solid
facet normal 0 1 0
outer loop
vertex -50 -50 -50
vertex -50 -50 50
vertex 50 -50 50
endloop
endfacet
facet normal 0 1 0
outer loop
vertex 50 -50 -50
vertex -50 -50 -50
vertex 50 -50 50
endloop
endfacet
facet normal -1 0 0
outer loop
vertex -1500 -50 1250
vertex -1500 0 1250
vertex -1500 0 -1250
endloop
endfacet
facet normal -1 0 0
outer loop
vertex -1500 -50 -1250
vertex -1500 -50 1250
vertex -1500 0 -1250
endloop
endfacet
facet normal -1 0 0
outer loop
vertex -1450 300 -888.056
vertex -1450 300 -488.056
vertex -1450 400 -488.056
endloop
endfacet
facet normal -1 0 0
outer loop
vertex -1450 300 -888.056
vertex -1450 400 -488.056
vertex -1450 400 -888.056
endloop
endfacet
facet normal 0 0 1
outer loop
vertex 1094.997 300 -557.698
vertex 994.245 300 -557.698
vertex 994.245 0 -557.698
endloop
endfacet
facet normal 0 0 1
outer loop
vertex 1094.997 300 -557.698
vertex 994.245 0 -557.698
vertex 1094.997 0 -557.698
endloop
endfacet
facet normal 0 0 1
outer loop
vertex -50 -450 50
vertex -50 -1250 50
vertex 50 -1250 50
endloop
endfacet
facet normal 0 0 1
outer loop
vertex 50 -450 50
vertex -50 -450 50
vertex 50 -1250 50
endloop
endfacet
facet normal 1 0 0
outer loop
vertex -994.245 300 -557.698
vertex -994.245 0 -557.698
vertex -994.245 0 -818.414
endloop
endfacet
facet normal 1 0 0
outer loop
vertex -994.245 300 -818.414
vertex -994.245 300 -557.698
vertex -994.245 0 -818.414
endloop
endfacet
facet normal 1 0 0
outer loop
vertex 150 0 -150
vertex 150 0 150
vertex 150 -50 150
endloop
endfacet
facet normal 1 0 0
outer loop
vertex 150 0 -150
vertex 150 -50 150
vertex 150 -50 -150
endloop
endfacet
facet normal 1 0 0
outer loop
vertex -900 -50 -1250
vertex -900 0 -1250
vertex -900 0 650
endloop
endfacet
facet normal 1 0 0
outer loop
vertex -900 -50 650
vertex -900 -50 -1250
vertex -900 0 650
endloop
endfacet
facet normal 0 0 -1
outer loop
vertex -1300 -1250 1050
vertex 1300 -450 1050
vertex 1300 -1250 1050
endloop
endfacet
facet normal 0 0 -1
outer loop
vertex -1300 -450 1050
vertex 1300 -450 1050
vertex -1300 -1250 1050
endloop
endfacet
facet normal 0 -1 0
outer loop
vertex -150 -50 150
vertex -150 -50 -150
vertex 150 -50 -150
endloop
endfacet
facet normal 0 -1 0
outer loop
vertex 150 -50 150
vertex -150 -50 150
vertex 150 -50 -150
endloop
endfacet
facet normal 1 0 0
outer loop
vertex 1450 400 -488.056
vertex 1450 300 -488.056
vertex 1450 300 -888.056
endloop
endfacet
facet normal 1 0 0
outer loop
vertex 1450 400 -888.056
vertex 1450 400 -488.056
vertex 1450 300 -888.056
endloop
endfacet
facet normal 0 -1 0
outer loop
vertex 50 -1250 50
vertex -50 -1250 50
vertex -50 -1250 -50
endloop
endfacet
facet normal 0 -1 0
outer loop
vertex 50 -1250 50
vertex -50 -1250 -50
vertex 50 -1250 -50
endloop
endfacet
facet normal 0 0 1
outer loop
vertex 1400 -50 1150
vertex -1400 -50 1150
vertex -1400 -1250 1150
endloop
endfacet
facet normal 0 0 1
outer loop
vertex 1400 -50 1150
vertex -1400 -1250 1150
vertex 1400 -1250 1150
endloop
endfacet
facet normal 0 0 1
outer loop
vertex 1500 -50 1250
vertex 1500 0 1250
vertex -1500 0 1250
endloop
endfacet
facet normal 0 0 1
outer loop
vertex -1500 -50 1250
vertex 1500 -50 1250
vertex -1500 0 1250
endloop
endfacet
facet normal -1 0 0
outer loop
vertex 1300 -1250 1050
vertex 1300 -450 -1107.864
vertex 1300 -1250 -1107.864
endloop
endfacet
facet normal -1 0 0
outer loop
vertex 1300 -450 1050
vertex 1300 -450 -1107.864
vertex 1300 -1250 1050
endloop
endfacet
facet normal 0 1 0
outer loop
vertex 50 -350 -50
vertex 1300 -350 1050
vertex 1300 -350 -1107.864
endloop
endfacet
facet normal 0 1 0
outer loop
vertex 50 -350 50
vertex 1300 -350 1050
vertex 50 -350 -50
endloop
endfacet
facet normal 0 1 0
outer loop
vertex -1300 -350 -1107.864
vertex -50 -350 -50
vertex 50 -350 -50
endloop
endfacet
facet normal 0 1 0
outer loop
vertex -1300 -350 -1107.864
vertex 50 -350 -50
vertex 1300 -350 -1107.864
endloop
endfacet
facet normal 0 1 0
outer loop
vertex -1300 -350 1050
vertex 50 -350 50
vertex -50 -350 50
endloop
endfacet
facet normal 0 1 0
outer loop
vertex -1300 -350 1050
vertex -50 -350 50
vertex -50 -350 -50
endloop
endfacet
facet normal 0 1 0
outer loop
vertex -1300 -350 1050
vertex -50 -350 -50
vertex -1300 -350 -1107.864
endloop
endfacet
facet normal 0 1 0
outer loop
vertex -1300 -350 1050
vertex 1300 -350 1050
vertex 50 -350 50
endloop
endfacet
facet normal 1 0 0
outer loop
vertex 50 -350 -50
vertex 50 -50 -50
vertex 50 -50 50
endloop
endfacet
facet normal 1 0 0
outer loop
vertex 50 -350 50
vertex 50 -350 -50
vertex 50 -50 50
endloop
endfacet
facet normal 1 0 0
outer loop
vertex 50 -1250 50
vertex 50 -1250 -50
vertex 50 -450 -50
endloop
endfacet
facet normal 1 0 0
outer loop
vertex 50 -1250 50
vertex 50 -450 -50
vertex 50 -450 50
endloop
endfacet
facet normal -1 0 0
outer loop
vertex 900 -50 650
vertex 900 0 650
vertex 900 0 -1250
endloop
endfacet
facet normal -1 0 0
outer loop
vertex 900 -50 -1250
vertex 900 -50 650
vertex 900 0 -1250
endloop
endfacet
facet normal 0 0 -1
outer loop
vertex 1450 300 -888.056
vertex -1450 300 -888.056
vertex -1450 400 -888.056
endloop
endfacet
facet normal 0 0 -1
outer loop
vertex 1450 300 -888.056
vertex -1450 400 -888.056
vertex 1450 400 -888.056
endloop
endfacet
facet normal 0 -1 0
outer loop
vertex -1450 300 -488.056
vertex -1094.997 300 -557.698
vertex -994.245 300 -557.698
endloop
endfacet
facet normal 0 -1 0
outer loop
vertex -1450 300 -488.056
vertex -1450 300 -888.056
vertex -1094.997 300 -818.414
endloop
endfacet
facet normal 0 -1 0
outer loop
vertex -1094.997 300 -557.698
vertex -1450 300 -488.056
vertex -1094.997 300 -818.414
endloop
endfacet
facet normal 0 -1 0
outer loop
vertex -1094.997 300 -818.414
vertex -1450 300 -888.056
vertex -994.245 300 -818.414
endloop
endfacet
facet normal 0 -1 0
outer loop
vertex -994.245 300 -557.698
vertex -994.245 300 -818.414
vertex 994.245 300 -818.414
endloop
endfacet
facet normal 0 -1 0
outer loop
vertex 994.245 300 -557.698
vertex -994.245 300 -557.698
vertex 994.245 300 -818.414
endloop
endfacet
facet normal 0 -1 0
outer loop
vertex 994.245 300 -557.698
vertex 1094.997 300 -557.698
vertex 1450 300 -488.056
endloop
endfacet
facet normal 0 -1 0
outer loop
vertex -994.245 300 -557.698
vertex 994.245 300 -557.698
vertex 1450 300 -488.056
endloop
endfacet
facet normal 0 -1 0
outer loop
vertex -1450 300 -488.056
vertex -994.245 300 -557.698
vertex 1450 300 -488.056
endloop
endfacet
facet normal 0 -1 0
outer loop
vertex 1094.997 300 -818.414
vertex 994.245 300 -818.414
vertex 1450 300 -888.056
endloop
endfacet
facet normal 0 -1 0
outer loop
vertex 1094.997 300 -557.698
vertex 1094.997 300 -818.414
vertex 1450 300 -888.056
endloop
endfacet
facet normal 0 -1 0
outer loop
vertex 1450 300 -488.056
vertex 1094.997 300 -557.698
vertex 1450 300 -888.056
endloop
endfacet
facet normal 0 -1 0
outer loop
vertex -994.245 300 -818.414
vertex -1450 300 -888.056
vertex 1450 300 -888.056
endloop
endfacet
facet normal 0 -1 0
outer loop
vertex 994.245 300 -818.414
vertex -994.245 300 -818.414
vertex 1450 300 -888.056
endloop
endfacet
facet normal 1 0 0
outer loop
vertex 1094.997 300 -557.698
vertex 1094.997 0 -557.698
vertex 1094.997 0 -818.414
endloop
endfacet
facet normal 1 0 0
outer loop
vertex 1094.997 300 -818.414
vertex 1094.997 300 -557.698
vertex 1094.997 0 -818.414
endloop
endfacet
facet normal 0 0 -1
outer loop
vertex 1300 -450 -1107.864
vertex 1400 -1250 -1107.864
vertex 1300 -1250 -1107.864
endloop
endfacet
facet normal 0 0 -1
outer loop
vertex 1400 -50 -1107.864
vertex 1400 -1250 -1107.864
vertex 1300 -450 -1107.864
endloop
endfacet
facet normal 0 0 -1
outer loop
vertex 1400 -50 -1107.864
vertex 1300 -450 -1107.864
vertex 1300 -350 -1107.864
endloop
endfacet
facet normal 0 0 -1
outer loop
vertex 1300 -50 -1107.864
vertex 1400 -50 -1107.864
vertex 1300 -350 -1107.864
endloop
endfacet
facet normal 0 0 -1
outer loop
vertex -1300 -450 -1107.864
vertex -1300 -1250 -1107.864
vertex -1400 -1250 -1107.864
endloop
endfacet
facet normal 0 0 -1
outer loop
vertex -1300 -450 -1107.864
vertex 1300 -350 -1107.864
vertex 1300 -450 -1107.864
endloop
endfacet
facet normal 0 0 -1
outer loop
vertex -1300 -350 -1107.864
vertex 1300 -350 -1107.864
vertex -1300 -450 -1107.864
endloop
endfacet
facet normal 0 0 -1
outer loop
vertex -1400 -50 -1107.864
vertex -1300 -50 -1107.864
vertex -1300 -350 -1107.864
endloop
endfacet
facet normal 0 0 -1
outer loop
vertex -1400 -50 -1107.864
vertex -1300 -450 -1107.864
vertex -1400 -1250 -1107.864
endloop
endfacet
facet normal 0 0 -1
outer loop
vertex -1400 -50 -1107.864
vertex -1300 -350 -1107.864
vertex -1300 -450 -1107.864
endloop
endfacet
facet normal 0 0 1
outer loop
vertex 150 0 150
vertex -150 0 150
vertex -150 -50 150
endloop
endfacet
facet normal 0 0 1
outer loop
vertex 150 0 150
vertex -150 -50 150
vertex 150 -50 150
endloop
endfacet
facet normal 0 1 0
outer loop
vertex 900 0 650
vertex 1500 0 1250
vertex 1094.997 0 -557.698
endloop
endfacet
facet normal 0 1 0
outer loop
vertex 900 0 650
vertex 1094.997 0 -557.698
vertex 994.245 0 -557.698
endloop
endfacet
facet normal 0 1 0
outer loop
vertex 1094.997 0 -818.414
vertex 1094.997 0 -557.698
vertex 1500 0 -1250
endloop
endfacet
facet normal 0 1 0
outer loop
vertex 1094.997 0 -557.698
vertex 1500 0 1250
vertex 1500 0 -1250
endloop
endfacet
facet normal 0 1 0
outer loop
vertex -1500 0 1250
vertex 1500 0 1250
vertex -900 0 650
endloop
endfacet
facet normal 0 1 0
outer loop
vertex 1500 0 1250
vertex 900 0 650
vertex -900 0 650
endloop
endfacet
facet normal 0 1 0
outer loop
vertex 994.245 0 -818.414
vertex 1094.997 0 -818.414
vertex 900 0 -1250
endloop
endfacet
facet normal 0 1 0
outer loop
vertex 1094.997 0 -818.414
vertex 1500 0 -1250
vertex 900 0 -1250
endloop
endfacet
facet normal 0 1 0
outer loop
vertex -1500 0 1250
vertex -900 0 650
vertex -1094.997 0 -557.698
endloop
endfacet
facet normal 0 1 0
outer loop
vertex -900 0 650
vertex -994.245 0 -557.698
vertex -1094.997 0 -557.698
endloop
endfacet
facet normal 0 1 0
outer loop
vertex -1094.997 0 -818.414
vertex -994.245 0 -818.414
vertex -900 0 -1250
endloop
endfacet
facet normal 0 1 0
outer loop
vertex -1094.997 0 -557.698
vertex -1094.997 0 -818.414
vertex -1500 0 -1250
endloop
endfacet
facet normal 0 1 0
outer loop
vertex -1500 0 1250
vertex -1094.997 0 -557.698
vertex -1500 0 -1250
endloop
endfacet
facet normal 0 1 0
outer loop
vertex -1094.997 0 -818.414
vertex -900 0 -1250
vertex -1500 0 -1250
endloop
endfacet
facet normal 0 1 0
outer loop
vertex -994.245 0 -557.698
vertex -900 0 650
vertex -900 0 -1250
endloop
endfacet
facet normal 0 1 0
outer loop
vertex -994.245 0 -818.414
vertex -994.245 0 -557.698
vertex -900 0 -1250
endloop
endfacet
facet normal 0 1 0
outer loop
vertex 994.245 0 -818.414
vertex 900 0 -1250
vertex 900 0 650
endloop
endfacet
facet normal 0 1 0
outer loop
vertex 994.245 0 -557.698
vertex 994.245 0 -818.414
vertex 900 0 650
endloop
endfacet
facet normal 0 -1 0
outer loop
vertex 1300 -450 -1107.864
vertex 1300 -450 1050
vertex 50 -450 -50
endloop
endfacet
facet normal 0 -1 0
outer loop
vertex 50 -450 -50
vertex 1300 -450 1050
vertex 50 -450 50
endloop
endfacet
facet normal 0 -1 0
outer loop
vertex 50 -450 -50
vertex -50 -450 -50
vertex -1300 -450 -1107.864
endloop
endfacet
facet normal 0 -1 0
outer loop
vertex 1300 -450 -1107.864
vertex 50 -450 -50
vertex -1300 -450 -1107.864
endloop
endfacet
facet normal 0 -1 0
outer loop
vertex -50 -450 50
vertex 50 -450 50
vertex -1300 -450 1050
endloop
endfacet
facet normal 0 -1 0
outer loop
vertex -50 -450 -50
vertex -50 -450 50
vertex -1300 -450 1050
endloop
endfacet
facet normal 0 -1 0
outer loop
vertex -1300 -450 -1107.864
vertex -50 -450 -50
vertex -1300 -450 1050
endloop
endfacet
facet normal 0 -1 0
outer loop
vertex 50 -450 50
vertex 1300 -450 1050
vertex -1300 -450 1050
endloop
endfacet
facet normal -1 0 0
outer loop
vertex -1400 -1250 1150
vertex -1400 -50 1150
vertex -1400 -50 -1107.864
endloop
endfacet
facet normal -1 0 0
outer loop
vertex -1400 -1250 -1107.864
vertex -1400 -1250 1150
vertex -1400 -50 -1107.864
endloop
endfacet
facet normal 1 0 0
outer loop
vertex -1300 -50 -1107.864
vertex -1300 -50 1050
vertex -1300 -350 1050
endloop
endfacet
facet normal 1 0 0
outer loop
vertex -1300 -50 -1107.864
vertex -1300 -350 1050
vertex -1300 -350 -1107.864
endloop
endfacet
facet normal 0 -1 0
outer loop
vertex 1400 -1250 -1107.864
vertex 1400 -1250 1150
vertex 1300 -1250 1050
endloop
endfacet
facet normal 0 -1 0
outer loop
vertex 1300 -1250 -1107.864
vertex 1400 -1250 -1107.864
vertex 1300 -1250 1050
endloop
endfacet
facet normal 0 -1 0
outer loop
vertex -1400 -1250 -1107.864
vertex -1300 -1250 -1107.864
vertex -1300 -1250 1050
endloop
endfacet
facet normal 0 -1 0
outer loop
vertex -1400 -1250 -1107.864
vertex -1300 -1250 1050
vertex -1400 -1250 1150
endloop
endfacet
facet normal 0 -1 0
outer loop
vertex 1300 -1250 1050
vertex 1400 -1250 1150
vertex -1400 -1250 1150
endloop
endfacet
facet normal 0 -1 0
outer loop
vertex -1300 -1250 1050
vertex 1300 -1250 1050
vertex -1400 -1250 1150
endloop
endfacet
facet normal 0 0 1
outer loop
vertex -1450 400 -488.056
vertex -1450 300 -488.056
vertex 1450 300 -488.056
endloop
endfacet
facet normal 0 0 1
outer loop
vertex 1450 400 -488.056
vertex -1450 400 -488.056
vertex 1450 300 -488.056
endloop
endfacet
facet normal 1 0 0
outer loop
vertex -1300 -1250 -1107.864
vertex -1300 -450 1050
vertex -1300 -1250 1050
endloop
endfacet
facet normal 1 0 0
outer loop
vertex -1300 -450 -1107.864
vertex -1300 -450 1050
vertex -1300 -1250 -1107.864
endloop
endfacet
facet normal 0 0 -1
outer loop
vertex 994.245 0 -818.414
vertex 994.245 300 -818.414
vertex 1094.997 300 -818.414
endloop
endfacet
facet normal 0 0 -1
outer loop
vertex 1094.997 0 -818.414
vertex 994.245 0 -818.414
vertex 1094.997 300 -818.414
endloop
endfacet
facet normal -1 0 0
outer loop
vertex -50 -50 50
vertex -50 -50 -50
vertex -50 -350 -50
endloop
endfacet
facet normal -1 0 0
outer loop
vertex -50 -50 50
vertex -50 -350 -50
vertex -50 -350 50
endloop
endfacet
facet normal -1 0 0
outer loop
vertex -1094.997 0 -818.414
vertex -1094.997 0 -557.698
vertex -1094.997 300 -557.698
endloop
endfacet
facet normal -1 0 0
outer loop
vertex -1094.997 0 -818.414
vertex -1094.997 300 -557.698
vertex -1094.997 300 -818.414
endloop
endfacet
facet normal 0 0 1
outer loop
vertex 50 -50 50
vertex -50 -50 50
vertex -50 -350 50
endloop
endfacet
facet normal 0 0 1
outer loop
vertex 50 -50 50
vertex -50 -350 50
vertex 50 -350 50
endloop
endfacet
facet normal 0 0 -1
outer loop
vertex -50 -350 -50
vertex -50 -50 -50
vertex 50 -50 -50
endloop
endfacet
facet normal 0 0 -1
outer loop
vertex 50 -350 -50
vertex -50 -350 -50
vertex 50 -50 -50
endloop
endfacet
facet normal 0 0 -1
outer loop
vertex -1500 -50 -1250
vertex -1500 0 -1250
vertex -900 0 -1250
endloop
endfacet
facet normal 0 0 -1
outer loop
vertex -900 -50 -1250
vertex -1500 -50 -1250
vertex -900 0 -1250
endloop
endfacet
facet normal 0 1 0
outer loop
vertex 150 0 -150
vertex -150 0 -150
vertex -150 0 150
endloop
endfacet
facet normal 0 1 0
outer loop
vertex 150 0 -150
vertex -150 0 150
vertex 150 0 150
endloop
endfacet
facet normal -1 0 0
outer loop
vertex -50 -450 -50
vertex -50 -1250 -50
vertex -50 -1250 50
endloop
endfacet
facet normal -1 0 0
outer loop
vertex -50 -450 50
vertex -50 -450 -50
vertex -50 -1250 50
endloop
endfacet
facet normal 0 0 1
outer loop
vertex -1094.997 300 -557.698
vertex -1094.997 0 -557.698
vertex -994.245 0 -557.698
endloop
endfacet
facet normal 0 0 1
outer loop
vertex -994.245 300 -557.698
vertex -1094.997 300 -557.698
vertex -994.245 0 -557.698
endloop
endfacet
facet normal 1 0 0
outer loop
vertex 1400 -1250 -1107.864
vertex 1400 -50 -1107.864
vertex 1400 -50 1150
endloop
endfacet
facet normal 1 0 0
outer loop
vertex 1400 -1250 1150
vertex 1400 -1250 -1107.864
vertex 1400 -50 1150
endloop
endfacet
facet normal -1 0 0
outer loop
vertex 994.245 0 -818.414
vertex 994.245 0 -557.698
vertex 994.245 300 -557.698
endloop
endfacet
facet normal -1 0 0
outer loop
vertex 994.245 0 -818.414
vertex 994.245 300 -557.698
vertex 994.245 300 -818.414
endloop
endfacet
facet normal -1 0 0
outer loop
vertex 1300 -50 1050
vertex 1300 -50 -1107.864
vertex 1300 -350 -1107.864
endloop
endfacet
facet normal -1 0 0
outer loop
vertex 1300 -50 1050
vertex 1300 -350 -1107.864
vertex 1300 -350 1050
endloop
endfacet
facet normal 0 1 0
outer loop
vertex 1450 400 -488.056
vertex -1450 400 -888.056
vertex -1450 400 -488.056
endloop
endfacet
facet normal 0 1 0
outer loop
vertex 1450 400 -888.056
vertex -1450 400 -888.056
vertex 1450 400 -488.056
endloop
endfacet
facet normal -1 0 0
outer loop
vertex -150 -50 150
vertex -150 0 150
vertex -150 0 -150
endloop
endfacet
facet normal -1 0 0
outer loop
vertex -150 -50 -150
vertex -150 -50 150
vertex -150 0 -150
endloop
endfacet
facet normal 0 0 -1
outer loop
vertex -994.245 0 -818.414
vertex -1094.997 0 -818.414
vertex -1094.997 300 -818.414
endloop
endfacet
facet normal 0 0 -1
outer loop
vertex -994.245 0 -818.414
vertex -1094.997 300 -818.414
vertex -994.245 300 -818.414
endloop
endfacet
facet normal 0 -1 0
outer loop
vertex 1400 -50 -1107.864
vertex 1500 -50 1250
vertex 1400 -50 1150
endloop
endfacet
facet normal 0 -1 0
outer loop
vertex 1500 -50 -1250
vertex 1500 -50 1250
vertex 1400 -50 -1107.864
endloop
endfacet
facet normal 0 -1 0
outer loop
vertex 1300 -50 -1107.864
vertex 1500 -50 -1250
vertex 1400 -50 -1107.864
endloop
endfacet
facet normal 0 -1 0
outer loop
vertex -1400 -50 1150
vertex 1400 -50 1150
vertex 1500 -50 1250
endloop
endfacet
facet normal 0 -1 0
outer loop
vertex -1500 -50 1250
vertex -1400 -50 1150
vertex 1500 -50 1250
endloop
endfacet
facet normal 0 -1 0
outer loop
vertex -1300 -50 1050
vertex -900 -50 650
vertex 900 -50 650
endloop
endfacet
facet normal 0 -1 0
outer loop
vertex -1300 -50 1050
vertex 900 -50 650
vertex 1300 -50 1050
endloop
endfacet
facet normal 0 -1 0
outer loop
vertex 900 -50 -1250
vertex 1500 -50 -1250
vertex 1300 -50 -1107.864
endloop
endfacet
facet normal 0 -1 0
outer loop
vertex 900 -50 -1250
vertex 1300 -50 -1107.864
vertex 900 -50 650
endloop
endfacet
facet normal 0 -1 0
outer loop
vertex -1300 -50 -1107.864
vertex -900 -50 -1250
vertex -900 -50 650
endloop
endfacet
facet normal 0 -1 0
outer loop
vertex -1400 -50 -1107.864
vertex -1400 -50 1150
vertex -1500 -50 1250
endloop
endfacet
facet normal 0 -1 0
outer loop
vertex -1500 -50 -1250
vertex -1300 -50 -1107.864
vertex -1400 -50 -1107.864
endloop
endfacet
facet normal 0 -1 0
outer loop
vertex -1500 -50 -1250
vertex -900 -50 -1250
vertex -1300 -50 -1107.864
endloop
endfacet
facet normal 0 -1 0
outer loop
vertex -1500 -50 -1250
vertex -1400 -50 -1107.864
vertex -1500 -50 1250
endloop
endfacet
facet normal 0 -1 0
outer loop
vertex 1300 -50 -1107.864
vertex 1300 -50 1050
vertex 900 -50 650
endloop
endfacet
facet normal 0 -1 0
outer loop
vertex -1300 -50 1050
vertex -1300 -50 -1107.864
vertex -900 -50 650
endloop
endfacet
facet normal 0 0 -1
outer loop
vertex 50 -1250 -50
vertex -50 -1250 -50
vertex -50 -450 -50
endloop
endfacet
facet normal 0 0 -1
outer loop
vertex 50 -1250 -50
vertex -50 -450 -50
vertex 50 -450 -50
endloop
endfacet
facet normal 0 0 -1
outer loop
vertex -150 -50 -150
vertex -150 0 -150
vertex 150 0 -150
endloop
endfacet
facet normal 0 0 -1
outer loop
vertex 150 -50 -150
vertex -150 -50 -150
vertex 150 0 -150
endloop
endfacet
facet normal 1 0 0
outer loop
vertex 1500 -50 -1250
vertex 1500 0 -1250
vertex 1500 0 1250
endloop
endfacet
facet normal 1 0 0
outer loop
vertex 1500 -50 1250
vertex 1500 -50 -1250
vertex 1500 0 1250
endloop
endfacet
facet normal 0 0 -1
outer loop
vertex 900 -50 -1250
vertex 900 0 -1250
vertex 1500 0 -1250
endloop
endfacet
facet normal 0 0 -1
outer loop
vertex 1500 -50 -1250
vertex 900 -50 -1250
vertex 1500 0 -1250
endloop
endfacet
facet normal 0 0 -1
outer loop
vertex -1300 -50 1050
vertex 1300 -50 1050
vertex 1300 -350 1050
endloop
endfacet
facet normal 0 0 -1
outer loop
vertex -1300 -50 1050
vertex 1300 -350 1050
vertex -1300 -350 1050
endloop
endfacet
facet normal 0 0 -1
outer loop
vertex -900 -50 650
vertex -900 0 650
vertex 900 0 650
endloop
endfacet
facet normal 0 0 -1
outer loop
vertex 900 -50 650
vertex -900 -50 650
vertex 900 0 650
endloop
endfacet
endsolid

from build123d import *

# Parameters (mm, degrees)
BOSS_EXTRUDE1_DEPTH   = 50
SKETCH1_W             = 300
SKETCH1_H             = 300
BOSS_EXTRUDE1_2_DEPTH = 50
SKETCH2_W             = 100
SKETCH2_H             = 100
BOSS_EXTRUDE2_DEPTH   = 1200
BOSS_EXTRUDE3_REACH   = 3019.035
SKETCH3_W             = 2600
SKETCH3_H             = 100
SKETCH4_W             = 100.752159197
SKETCH4_H             = 260.715900264
BOSS_EXTRUDE4_DEPTH   = 300
SKETCH5_W             = 2900
SKETCH5_H             = 400
BOSS_EXTRUDE5_DEPTH   = 100


with BuildPart() as part:
    # Sketch1 → Boss-Extrude1 (new body)
    with BuildSketch(Plane(origin=(0, 0, 0), x_dir=(1, 0, 0), z_dir=(0, 1, 0))):
        Polygon((-900, 1250), (-900, -650), (900, -650), (900, 1250), (1500, 1250), (1500, -1250), (-1500, -1250), (-1500, 1250), align=None)
    extrude(amount=-BOSS_EXTRUDE1_DEPTH)

    # Sketch2 → Boss-Extrude2 (add)
    with BuildSketch(Plane.XZ.offset(50)):
        Polygon((-1400, 1150), (1400, 1150), (1400, 1050), (1400, -1107.863798508), (1300, -1107.863798508), (1300, 1050), (-1300, 1050), (-1300, -1107.863798508), (-1400, -1107.863798508), (-1400, 1050), align=None)
        Rectangle(SKETCH2_W, SKETCH2_H)
    extrude(amount=BOSS_EXTRUDE2_DEPTH)


with BuildPart() as body_2:
    # Sketch1 → Boss-Extrude1 2 (new body)
    with BuildSketch(Plane(origin=(0, 0, 0), x_dir=(1, 0, 0), z_dir=(0, 1, 0))):
        Rectangle(SKETCH1_W, SKETCH1_H)
    extrude(amount=-BOSS_EXTRUDE1_2_DEPTH)


with BuildPart() as boss_extrude2_piece_1:
    # of the separate pieces the step leaves, piece 1, a body of its own (boss_extrude2_pieces)
    add(part.part.solids().sort_by_distance((-900, 0, -1250))[0])

    # Boss-Extrude3: up to this face of the body (flat: up to its plane)
    boss_extrude3_end = Plane(boss_extrude2_piece_1.part.faces().sort_by_distance((-1350, -650, -1107.863798508))[0])
    # Sketch3 → Boss-Extrude3 (add, up to the picked face)
    with BuildSketch(Plane(origin=(0, 0, 1050), x_dir=(-1, 0, 0), z_dir=(0, 0, -1)), mode=Mode.PRIVATE) as boss_extrude3_sk1:
        with Locations((0, -400)):
            Rectangle(SKETCH3_W, SKETCH3_H)
    boss_extrude3_tool1 = split(extrude(boss_extrude3_sk1.sketch, amount=BOSS_EXTRUDE3_REACH, mode=Mode.PRIVATE), bisect_by=boss_extrude3_end, keep=Keep.BOTH, mode=Mode.PRIVATE)


with BuildPart() as boss_extrude2_piece_2:
    # of the separate pieces the step leaves, piece 2, a body of its own (boss_extrude2_pieces)
    add(part.part.solids().sort_by_distance((50, -50, -50))[0])


with BuildPart() as boss_extrude2_piece_1_1:
    add(boss_extrude2_piece_1.part)

    add(boss_extrude2_piece_2.part)  # Boss-Extrude3 merges Boss-Extrude2 piece 2
    add(boss_extrude3_tool1.solids().sort_by(Axis((0, -400, 1050), (0, 0, -1)))[0])

    # Sketch4 → Boss-Extrude4 (add)
    with BuildSketch(Plane(origin=(0, 0, 0), x_dir=(1, 0, 0), z_dir=(0, 1, 0))):
        with Locations((1044.621190012, 688.056214023)):
            Rectangle(SKETCH4_W, SKETCH4_H)
        with Locations((-1044.621190012, 688.056214023)):
            Rectangle(SKETCH4_W, SKETCH4_H)
    extrude(amount=BOSS_EXTRUDE4_DEPTH)

    # Sketch5 → Boss-Extrude5 (add)
    with BuildSketch(Plane(origin=(0, 300, 0), x_dir=(1, 0, 0), z_dir=(0, 1, 0))):
        with Locations((0, 688.056214023)):
            Rectangle(SKETCH5_W, SKETCH5_H)
    extrude(amount=BOSS_EXTRUDE5_DEPTH)


solid = Compound([body_2.part, boss_extrude2_piece_1_1.part])
